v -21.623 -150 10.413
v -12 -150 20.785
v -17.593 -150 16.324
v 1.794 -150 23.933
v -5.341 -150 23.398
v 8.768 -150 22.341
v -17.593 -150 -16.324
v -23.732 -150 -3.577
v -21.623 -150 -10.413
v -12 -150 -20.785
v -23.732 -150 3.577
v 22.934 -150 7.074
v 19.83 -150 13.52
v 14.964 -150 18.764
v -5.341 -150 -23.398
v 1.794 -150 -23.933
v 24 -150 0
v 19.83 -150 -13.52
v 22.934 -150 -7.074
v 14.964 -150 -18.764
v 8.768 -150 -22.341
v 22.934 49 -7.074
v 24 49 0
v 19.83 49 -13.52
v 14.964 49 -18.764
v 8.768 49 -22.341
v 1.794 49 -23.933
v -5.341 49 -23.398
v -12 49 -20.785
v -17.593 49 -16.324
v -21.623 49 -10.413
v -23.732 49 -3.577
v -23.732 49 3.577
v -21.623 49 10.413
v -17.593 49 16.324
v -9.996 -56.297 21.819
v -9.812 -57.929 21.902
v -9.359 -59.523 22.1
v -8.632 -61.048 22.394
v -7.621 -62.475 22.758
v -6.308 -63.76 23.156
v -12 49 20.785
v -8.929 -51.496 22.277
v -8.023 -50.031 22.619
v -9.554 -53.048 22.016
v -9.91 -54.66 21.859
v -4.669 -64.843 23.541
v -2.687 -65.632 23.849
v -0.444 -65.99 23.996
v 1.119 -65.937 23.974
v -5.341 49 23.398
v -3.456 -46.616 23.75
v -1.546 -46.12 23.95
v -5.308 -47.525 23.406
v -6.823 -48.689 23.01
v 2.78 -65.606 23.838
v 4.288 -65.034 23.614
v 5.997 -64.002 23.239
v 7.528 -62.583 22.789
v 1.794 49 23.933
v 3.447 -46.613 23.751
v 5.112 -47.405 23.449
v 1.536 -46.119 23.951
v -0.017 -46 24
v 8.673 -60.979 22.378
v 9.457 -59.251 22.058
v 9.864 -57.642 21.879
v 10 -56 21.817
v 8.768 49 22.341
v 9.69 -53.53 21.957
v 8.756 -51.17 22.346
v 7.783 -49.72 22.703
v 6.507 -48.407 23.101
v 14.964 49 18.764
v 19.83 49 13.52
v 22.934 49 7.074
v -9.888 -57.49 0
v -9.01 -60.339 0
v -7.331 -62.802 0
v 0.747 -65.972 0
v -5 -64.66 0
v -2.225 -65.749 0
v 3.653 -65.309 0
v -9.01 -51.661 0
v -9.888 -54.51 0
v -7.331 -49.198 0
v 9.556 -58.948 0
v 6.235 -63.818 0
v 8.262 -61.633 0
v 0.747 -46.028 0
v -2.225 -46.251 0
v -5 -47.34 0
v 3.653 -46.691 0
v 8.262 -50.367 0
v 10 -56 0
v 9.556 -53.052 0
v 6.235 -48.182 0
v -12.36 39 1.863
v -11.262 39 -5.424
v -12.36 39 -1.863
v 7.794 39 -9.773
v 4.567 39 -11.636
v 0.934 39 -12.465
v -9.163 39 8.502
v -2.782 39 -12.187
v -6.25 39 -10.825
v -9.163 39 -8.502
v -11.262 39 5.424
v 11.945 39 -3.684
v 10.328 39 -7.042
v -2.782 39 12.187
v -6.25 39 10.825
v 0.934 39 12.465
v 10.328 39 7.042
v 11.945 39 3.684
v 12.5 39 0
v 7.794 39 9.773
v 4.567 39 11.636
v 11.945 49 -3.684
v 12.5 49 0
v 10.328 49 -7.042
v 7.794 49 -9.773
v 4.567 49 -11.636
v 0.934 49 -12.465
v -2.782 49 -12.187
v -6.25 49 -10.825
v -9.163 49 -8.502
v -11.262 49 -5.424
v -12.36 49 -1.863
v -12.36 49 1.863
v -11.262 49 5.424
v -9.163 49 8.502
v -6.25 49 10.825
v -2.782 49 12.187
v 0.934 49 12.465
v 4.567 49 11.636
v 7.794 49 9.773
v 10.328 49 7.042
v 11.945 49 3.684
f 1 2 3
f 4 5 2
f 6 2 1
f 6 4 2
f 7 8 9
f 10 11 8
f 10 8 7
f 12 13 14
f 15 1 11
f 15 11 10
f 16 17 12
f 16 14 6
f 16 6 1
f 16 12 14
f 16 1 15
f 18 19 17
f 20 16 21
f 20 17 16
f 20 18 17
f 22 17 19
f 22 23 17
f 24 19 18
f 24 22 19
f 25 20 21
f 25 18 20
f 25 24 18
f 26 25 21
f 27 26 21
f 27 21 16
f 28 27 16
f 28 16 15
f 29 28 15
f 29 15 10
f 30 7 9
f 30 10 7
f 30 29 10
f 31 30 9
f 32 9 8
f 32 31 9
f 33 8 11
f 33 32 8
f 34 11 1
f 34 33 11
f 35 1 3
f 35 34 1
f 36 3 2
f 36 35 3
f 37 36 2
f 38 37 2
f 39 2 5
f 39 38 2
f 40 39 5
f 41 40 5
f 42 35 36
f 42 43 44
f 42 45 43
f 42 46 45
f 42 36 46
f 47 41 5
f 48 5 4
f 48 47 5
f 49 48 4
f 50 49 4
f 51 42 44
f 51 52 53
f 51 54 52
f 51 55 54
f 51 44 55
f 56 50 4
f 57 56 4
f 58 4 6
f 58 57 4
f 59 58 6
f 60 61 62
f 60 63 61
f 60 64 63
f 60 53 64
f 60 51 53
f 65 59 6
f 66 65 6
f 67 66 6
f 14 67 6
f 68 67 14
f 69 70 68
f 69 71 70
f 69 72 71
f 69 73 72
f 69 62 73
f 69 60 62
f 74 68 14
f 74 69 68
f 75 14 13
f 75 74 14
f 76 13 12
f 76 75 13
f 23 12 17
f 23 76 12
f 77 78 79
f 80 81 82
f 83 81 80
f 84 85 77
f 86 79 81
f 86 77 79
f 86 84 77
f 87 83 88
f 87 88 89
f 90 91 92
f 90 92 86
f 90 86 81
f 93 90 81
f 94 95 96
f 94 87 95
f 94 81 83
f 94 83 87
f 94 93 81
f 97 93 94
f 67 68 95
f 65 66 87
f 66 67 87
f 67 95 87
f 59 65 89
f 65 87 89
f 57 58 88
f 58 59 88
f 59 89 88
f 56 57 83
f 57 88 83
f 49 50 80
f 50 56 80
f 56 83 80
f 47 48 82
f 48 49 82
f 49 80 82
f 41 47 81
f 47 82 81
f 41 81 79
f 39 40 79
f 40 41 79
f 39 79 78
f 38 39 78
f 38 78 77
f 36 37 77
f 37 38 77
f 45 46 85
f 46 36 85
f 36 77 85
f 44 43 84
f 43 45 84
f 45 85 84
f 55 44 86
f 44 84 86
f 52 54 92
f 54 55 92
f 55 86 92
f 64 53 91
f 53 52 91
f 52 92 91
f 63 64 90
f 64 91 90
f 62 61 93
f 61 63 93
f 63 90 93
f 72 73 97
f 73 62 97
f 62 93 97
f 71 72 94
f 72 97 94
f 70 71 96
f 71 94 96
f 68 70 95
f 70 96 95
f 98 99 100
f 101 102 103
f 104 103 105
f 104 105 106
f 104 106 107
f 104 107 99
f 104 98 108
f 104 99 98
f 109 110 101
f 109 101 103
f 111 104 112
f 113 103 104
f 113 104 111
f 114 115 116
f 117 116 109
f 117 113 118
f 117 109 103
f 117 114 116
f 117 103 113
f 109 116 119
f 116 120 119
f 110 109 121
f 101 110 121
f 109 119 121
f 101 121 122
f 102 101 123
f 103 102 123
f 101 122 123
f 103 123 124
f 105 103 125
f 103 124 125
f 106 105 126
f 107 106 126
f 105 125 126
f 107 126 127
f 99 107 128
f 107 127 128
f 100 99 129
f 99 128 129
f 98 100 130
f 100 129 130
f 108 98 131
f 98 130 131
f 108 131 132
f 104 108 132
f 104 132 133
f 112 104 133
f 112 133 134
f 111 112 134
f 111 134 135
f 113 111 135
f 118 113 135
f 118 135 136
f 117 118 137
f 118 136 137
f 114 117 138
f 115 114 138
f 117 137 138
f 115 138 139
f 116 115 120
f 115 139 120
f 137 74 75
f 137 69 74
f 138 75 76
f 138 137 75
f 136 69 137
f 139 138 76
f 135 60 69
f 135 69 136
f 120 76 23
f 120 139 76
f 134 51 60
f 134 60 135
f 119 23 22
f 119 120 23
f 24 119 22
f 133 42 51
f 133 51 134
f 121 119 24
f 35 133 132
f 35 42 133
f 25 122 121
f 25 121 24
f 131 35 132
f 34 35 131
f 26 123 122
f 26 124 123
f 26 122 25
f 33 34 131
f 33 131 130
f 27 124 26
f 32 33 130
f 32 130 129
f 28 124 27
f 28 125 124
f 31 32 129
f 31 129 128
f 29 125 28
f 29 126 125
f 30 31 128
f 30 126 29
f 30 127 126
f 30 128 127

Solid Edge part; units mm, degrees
sketch "Sketch1" plane through (0, 0, 0) normal (0, -1, 0) x (1, 0, 0)
  circle A0 centre (0, 0) radius 24
extrude "Protrusion1" add sketch "Sketch1" along normal mid plane 300
sketch "Sketch2" plane through (0, 0, 0) normal (0, 0, 1) x (1, 0, 0)
  circle A0 centre (0, -56) radius 10
extrude "ExtrudedCutout_2" cut sketch "Sketch2" along normal blind 65.6181
sketch "Sketch3" plane through (0, 0, 0) normal (1, 0, 0) x (0, 1, 0)
  line L0 (49, 68.8622) -> (49, -45.9643)
  dimension "D1" = 199
extrude "ExtrudedCutout_3" cut sketch "Sketch3" along normal mid plane 174.551 material side at (0, 49.05, 11.4489)
sketch "Sketch4" plane through (0, 49, 0) normal (0, 1, 0) x (1, 0, 0)
  circle A0 centre (0, 0) radius 12.5
  dimension "D1" = 25
extrude "ExtrudedCutout_4" cut sketch "Sketch4" against normal blind 10
